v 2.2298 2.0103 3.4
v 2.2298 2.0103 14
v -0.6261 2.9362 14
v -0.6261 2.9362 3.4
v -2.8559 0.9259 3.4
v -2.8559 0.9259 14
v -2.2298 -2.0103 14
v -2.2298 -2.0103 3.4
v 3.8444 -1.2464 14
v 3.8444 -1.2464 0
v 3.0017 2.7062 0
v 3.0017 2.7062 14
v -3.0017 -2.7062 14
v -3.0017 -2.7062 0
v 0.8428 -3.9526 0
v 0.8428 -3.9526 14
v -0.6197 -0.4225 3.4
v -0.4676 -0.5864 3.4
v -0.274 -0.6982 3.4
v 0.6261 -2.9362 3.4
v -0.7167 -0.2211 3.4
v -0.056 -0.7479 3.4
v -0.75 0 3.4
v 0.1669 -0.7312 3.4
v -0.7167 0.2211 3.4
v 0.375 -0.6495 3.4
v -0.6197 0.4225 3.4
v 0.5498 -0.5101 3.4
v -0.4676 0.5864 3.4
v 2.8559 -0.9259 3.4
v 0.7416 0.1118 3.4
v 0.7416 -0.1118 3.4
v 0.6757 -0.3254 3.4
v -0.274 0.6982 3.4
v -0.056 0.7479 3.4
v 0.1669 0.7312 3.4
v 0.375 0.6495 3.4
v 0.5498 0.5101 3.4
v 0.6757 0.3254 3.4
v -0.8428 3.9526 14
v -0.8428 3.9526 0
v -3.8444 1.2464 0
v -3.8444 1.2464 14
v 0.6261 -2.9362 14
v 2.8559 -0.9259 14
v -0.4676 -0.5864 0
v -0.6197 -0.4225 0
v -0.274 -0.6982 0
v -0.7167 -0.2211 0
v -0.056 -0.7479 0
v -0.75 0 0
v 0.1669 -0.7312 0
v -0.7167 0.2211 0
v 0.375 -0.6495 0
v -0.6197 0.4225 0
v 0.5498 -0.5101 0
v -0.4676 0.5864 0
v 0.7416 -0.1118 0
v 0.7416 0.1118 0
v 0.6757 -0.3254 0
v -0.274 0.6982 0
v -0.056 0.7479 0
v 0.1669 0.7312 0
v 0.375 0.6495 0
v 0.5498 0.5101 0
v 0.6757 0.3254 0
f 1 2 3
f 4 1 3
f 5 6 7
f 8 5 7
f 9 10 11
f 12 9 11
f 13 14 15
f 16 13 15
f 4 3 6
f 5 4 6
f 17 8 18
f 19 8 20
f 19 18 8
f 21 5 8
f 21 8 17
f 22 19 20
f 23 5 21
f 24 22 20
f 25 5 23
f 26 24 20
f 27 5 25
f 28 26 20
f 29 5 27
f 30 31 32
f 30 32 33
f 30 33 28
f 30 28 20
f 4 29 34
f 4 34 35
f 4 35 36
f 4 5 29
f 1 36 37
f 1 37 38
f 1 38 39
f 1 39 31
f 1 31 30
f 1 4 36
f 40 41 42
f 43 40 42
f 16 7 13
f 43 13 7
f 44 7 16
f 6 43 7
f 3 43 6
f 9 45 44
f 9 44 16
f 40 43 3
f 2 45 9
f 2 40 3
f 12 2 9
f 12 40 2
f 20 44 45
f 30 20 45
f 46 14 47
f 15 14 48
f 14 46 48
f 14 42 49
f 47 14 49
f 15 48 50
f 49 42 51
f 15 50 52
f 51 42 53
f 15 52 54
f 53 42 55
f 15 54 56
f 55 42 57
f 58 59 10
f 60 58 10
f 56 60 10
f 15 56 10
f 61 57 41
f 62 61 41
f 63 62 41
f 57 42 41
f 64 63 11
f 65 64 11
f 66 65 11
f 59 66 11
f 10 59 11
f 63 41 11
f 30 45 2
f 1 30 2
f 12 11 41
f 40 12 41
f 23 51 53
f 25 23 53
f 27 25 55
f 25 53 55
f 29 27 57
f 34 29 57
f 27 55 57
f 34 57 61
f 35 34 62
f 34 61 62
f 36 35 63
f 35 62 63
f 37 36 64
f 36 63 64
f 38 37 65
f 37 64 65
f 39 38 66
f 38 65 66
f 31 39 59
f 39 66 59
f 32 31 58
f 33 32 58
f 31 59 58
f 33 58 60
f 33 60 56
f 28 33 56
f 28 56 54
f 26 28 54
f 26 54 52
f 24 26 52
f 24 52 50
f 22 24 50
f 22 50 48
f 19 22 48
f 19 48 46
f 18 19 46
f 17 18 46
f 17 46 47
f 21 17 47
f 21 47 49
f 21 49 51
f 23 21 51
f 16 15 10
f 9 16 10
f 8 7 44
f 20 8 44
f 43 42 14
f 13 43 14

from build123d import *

# Parameters (mm, degrees)
RESSALTO_EXTRUS_O1_DEPTH = 14
CORTE_EXTRUS_O1_DEPTH    = 10.6
CORTE_EXTRUS_O2_REACH    = 17.047
ESBO_O3_R                = 0.75


with BuildPart() as part:
    # Esboço1 → Ressalto-extrusão1 (new body)
    with BuildSketch(Plane.XY):
        Polygon((-0.842772028, 3.952602768), (-3.844440422, 1.246439398), (-3.001668394, -2.70616337), (0.842772028, -3.952602768), (3.844440422, -1.246439398), (3.001668394, 2.70616337), align=None)
    extrude(amount=RESSALTO_EXTRUS_O1_DEPTH)

    # Esboço2 → Corte-extrusão1 (cut)
    with BuildSketch(Plane.XY.offset(14)):
        Polygon((2.229810807, 2.010292789), (-0.626059221, 2.936219199), (-2.855870028, 0.92592641), (-2.229810807, -2.010292789), (0.626059221, -2.936219199), (2.855870028, -0.92592641), align=None)
    extrude(amount=-CORTE_EXTRUS_O1_DEPTH, mode=Mode.SUBTRACT)

    # Esboço3 → Corte-extrusão2 (cut, up to next)
    with BuildSketch(Plane(origin=(0, 0, 0), x_dir=(-1, 0, 0), z_dir=(0, 0, -1)), mode=Mode.PRIVATE) as corte_extrus_o2_sk1:
        Circle(ESBO_O3_R)
    corte_extrus_o2_tool1 = extrude(corte_extrus_o2_sk1.sketch, amount=-CORTE_EXTRUS_O2_REACH, mode=Mode.PRIVATE) & part.part
    add(corte_extrus_o2_tool1.solids().sort_by_distance((0, 0, 0))[0], mode=Mode.SUBTRACT)


solid = part.part
